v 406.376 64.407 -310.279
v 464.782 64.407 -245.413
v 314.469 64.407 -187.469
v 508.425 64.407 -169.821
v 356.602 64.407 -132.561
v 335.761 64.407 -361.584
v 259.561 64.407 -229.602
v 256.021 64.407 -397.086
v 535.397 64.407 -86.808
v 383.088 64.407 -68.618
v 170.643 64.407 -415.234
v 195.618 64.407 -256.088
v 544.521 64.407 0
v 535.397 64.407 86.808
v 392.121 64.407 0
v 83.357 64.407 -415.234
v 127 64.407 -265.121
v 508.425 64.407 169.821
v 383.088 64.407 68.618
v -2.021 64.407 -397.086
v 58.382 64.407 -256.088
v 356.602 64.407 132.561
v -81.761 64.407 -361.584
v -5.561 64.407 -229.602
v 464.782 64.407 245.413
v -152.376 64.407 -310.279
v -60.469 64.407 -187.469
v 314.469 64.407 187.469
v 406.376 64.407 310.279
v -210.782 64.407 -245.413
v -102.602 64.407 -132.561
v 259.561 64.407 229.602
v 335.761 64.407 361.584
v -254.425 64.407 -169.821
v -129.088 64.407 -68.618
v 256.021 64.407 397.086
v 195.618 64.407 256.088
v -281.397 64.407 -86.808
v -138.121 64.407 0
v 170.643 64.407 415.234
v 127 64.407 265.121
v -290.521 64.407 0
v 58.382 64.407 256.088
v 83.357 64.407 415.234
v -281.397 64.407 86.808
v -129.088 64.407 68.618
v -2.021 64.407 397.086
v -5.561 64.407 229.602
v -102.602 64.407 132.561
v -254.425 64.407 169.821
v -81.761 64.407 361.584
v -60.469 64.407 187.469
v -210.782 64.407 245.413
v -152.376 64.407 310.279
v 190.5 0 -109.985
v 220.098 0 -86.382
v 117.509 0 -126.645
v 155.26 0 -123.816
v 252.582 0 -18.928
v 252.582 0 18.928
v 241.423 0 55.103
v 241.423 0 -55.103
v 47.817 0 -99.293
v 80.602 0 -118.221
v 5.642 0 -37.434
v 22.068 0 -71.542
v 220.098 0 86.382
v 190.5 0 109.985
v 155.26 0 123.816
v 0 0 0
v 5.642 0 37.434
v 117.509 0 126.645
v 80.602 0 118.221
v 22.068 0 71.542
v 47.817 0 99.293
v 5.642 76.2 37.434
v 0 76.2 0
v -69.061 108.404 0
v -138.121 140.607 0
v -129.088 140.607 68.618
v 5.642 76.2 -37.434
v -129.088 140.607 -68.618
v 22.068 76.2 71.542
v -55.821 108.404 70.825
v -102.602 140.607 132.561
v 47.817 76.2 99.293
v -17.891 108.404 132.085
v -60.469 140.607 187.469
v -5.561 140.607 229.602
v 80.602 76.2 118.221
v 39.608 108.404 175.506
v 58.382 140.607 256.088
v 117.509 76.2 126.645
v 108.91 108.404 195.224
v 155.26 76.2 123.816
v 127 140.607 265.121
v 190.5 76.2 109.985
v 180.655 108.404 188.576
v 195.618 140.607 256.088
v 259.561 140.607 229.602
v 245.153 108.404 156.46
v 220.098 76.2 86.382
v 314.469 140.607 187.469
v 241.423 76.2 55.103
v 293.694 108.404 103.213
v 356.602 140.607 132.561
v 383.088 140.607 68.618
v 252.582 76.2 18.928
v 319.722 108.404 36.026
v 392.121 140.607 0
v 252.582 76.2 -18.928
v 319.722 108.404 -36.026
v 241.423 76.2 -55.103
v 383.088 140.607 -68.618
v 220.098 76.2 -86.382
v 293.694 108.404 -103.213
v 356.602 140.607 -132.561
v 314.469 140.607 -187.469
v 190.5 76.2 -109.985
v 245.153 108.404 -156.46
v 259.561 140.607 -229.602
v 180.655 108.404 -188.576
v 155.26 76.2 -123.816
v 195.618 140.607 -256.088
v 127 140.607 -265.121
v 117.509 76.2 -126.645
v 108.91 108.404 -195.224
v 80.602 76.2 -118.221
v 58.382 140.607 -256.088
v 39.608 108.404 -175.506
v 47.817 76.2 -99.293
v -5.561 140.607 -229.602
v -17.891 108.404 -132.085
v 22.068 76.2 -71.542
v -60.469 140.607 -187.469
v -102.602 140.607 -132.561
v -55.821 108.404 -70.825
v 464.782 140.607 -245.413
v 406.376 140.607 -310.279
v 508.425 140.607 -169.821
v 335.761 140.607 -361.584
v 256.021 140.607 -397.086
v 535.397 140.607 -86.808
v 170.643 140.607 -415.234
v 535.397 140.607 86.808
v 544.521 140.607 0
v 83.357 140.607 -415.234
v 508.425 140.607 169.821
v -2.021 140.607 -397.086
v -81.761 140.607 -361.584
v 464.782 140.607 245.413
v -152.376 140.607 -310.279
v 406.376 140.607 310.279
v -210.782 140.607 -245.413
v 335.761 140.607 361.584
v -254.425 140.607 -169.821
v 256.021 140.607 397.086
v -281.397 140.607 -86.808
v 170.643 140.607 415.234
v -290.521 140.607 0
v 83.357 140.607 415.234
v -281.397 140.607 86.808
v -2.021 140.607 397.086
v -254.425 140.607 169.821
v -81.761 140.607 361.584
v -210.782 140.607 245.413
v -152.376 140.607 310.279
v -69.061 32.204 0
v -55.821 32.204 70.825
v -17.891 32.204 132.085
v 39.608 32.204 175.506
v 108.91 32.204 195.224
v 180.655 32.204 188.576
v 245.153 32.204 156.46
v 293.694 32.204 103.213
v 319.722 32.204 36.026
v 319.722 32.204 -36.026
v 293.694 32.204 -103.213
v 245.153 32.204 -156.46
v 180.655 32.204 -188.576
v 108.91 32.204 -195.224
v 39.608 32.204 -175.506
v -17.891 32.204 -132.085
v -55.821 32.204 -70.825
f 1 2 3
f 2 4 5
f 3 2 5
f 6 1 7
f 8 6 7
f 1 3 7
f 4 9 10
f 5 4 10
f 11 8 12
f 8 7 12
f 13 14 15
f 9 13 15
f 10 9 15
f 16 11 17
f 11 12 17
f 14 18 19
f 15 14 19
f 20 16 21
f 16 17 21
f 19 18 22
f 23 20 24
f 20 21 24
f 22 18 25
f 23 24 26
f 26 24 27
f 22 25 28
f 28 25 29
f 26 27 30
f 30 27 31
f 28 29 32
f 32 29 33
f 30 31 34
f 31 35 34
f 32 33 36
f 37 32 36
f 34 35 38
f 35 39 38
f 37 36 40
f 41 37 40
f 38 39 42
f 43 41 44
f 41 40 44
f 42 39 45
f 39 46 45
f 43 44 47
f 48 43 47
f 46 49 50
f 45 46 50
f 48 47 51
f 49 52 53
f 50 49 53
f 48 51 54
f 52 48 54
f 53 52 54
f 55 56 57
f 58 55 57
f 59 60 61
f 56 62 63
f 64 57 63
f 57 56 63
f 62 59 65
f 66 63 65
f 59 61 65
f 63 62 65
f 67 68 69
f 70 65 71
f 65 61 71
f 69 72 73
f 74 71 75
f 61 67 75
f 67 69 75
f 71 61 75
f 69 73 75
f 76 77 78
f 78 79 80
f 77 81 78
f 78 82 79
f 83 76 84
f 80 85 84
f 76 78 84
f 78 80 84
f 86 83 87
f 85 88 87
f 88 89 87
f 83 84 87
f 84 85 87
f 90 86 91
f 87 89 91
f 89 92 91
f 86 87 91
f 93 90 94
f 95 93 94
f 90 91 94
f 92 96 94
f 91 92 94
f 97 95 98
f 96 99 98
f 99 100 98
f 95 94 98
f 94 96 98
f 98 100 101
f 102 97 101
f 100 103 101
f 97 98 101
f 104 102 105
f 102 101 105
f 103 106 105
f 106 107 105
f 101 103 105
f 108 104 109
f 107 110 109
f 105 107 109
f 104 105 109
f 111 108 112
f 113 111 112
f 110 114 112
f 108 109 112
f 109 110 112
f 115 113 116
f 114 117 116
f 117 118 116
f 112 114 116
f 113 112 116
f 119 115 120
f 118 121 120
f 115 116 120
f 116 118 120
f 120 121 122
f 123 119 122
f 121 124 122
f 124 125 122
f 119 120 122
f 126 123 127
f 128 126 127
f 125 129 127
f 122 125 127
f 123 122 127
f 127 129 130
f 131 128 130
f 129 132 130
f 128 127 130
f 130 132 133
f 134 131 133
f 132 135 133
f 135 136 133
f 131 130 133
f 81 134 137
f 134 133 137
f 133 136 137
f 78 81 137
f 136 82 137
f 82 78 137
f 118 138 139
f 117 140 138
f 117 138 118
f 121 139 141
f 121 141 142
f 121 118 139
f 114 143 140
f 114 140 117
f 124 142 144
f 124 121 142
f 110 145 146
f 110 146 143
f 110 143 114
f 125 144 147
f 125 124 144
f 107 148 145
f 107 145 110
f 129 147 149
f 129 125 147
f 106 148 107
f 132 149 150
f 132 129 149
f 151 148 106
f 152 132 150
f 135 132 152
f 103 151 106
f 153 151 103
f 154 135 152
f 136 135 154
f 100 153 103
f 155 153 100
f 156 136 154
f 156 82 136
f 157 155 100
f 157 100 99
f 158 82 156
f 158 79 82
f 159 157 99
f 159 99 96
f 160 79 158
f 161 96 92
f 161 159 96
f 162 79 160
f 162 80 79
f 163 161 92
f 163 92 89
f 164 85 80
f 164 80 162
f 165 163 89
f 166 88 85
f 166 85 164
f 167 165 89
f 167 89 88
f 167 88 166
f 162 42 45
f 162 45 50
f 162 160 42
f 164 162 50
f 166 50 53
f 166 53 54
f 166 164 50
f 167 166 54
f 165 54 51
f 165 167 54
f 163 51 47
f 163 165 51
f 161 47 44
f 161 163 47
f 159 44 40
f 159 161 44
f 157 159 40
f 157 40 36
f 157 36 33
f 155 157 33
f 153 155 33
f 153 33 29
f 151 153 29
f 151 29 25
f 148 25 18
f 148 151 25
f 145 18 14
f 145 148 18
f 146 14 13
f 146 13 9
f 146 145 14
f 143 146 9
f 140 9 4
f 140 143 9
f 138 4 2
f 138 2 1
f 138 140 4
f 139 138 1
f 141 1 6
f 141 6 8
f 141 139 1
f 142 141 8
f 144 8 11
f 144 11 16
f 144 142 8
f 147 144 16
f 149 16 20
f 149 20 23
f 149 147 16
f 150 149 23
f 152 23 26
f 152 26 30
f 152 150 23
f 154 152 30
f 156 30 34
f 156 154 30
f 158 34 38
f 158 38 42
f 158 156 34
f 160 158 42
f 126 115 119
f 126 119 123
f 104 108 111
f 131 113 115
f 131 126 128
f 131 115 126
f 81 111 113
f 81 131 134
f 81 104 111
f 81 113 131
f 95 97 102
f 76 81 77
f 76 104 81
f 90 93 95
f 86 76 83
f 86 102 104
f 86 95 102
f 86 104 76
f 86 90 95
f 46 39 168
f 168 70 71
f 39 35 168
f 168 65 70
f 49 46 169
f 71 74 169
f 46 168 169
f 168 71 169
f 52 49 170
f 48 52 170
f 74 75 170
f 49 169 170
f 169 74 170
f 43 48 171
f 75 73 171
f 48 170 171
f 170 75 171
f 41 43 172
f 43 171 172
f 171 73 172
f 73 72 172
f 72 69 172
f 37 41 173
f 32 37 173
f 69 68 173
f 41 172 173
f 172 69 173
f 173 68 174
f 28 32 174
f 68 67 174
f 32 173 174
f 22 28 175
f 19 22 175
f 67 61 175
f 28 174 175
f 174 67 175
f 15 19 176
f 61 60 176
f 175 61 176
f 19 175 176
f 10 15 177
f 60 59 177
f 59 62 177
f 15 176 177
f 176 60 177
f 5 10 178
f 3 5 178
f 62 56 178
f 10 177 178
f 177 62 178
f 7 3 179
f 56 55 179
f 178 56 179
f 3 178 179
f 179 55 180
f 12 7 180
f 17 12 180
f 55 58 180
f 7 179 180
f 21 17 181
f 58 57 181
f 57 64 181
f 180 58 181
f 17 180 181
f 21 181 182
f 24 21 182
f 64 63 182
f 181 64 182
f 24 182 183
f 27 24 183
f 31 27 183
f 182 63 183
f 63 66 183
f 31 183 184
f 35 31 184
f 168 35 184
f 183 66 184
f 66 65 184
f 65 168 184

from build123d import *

# Parameters (mm, degrees)
F0_W   = 152.4
F0_H   = 76.2
F0_W_2 = 127


with BuildPart() as f1:
    # F0 (on Top) → F1 (revolve)
    with BuildSketch(Plane.XY):
        with Locations((-214.321307, 102.507023)):
            Rectangle(F0_W, F0_H)
        Polygon((-138.121307, 64.407023), (0, 0), (0, 76.2), (-138.121307, 140.607023), align=None)
        with Locations((63.5, 38.1)):
            Rectangle(F0_W_2, F0_H)
    revolve(axis=Axis((127, 38.1, 0), (0, 1, 0)))


solid = f1.part
